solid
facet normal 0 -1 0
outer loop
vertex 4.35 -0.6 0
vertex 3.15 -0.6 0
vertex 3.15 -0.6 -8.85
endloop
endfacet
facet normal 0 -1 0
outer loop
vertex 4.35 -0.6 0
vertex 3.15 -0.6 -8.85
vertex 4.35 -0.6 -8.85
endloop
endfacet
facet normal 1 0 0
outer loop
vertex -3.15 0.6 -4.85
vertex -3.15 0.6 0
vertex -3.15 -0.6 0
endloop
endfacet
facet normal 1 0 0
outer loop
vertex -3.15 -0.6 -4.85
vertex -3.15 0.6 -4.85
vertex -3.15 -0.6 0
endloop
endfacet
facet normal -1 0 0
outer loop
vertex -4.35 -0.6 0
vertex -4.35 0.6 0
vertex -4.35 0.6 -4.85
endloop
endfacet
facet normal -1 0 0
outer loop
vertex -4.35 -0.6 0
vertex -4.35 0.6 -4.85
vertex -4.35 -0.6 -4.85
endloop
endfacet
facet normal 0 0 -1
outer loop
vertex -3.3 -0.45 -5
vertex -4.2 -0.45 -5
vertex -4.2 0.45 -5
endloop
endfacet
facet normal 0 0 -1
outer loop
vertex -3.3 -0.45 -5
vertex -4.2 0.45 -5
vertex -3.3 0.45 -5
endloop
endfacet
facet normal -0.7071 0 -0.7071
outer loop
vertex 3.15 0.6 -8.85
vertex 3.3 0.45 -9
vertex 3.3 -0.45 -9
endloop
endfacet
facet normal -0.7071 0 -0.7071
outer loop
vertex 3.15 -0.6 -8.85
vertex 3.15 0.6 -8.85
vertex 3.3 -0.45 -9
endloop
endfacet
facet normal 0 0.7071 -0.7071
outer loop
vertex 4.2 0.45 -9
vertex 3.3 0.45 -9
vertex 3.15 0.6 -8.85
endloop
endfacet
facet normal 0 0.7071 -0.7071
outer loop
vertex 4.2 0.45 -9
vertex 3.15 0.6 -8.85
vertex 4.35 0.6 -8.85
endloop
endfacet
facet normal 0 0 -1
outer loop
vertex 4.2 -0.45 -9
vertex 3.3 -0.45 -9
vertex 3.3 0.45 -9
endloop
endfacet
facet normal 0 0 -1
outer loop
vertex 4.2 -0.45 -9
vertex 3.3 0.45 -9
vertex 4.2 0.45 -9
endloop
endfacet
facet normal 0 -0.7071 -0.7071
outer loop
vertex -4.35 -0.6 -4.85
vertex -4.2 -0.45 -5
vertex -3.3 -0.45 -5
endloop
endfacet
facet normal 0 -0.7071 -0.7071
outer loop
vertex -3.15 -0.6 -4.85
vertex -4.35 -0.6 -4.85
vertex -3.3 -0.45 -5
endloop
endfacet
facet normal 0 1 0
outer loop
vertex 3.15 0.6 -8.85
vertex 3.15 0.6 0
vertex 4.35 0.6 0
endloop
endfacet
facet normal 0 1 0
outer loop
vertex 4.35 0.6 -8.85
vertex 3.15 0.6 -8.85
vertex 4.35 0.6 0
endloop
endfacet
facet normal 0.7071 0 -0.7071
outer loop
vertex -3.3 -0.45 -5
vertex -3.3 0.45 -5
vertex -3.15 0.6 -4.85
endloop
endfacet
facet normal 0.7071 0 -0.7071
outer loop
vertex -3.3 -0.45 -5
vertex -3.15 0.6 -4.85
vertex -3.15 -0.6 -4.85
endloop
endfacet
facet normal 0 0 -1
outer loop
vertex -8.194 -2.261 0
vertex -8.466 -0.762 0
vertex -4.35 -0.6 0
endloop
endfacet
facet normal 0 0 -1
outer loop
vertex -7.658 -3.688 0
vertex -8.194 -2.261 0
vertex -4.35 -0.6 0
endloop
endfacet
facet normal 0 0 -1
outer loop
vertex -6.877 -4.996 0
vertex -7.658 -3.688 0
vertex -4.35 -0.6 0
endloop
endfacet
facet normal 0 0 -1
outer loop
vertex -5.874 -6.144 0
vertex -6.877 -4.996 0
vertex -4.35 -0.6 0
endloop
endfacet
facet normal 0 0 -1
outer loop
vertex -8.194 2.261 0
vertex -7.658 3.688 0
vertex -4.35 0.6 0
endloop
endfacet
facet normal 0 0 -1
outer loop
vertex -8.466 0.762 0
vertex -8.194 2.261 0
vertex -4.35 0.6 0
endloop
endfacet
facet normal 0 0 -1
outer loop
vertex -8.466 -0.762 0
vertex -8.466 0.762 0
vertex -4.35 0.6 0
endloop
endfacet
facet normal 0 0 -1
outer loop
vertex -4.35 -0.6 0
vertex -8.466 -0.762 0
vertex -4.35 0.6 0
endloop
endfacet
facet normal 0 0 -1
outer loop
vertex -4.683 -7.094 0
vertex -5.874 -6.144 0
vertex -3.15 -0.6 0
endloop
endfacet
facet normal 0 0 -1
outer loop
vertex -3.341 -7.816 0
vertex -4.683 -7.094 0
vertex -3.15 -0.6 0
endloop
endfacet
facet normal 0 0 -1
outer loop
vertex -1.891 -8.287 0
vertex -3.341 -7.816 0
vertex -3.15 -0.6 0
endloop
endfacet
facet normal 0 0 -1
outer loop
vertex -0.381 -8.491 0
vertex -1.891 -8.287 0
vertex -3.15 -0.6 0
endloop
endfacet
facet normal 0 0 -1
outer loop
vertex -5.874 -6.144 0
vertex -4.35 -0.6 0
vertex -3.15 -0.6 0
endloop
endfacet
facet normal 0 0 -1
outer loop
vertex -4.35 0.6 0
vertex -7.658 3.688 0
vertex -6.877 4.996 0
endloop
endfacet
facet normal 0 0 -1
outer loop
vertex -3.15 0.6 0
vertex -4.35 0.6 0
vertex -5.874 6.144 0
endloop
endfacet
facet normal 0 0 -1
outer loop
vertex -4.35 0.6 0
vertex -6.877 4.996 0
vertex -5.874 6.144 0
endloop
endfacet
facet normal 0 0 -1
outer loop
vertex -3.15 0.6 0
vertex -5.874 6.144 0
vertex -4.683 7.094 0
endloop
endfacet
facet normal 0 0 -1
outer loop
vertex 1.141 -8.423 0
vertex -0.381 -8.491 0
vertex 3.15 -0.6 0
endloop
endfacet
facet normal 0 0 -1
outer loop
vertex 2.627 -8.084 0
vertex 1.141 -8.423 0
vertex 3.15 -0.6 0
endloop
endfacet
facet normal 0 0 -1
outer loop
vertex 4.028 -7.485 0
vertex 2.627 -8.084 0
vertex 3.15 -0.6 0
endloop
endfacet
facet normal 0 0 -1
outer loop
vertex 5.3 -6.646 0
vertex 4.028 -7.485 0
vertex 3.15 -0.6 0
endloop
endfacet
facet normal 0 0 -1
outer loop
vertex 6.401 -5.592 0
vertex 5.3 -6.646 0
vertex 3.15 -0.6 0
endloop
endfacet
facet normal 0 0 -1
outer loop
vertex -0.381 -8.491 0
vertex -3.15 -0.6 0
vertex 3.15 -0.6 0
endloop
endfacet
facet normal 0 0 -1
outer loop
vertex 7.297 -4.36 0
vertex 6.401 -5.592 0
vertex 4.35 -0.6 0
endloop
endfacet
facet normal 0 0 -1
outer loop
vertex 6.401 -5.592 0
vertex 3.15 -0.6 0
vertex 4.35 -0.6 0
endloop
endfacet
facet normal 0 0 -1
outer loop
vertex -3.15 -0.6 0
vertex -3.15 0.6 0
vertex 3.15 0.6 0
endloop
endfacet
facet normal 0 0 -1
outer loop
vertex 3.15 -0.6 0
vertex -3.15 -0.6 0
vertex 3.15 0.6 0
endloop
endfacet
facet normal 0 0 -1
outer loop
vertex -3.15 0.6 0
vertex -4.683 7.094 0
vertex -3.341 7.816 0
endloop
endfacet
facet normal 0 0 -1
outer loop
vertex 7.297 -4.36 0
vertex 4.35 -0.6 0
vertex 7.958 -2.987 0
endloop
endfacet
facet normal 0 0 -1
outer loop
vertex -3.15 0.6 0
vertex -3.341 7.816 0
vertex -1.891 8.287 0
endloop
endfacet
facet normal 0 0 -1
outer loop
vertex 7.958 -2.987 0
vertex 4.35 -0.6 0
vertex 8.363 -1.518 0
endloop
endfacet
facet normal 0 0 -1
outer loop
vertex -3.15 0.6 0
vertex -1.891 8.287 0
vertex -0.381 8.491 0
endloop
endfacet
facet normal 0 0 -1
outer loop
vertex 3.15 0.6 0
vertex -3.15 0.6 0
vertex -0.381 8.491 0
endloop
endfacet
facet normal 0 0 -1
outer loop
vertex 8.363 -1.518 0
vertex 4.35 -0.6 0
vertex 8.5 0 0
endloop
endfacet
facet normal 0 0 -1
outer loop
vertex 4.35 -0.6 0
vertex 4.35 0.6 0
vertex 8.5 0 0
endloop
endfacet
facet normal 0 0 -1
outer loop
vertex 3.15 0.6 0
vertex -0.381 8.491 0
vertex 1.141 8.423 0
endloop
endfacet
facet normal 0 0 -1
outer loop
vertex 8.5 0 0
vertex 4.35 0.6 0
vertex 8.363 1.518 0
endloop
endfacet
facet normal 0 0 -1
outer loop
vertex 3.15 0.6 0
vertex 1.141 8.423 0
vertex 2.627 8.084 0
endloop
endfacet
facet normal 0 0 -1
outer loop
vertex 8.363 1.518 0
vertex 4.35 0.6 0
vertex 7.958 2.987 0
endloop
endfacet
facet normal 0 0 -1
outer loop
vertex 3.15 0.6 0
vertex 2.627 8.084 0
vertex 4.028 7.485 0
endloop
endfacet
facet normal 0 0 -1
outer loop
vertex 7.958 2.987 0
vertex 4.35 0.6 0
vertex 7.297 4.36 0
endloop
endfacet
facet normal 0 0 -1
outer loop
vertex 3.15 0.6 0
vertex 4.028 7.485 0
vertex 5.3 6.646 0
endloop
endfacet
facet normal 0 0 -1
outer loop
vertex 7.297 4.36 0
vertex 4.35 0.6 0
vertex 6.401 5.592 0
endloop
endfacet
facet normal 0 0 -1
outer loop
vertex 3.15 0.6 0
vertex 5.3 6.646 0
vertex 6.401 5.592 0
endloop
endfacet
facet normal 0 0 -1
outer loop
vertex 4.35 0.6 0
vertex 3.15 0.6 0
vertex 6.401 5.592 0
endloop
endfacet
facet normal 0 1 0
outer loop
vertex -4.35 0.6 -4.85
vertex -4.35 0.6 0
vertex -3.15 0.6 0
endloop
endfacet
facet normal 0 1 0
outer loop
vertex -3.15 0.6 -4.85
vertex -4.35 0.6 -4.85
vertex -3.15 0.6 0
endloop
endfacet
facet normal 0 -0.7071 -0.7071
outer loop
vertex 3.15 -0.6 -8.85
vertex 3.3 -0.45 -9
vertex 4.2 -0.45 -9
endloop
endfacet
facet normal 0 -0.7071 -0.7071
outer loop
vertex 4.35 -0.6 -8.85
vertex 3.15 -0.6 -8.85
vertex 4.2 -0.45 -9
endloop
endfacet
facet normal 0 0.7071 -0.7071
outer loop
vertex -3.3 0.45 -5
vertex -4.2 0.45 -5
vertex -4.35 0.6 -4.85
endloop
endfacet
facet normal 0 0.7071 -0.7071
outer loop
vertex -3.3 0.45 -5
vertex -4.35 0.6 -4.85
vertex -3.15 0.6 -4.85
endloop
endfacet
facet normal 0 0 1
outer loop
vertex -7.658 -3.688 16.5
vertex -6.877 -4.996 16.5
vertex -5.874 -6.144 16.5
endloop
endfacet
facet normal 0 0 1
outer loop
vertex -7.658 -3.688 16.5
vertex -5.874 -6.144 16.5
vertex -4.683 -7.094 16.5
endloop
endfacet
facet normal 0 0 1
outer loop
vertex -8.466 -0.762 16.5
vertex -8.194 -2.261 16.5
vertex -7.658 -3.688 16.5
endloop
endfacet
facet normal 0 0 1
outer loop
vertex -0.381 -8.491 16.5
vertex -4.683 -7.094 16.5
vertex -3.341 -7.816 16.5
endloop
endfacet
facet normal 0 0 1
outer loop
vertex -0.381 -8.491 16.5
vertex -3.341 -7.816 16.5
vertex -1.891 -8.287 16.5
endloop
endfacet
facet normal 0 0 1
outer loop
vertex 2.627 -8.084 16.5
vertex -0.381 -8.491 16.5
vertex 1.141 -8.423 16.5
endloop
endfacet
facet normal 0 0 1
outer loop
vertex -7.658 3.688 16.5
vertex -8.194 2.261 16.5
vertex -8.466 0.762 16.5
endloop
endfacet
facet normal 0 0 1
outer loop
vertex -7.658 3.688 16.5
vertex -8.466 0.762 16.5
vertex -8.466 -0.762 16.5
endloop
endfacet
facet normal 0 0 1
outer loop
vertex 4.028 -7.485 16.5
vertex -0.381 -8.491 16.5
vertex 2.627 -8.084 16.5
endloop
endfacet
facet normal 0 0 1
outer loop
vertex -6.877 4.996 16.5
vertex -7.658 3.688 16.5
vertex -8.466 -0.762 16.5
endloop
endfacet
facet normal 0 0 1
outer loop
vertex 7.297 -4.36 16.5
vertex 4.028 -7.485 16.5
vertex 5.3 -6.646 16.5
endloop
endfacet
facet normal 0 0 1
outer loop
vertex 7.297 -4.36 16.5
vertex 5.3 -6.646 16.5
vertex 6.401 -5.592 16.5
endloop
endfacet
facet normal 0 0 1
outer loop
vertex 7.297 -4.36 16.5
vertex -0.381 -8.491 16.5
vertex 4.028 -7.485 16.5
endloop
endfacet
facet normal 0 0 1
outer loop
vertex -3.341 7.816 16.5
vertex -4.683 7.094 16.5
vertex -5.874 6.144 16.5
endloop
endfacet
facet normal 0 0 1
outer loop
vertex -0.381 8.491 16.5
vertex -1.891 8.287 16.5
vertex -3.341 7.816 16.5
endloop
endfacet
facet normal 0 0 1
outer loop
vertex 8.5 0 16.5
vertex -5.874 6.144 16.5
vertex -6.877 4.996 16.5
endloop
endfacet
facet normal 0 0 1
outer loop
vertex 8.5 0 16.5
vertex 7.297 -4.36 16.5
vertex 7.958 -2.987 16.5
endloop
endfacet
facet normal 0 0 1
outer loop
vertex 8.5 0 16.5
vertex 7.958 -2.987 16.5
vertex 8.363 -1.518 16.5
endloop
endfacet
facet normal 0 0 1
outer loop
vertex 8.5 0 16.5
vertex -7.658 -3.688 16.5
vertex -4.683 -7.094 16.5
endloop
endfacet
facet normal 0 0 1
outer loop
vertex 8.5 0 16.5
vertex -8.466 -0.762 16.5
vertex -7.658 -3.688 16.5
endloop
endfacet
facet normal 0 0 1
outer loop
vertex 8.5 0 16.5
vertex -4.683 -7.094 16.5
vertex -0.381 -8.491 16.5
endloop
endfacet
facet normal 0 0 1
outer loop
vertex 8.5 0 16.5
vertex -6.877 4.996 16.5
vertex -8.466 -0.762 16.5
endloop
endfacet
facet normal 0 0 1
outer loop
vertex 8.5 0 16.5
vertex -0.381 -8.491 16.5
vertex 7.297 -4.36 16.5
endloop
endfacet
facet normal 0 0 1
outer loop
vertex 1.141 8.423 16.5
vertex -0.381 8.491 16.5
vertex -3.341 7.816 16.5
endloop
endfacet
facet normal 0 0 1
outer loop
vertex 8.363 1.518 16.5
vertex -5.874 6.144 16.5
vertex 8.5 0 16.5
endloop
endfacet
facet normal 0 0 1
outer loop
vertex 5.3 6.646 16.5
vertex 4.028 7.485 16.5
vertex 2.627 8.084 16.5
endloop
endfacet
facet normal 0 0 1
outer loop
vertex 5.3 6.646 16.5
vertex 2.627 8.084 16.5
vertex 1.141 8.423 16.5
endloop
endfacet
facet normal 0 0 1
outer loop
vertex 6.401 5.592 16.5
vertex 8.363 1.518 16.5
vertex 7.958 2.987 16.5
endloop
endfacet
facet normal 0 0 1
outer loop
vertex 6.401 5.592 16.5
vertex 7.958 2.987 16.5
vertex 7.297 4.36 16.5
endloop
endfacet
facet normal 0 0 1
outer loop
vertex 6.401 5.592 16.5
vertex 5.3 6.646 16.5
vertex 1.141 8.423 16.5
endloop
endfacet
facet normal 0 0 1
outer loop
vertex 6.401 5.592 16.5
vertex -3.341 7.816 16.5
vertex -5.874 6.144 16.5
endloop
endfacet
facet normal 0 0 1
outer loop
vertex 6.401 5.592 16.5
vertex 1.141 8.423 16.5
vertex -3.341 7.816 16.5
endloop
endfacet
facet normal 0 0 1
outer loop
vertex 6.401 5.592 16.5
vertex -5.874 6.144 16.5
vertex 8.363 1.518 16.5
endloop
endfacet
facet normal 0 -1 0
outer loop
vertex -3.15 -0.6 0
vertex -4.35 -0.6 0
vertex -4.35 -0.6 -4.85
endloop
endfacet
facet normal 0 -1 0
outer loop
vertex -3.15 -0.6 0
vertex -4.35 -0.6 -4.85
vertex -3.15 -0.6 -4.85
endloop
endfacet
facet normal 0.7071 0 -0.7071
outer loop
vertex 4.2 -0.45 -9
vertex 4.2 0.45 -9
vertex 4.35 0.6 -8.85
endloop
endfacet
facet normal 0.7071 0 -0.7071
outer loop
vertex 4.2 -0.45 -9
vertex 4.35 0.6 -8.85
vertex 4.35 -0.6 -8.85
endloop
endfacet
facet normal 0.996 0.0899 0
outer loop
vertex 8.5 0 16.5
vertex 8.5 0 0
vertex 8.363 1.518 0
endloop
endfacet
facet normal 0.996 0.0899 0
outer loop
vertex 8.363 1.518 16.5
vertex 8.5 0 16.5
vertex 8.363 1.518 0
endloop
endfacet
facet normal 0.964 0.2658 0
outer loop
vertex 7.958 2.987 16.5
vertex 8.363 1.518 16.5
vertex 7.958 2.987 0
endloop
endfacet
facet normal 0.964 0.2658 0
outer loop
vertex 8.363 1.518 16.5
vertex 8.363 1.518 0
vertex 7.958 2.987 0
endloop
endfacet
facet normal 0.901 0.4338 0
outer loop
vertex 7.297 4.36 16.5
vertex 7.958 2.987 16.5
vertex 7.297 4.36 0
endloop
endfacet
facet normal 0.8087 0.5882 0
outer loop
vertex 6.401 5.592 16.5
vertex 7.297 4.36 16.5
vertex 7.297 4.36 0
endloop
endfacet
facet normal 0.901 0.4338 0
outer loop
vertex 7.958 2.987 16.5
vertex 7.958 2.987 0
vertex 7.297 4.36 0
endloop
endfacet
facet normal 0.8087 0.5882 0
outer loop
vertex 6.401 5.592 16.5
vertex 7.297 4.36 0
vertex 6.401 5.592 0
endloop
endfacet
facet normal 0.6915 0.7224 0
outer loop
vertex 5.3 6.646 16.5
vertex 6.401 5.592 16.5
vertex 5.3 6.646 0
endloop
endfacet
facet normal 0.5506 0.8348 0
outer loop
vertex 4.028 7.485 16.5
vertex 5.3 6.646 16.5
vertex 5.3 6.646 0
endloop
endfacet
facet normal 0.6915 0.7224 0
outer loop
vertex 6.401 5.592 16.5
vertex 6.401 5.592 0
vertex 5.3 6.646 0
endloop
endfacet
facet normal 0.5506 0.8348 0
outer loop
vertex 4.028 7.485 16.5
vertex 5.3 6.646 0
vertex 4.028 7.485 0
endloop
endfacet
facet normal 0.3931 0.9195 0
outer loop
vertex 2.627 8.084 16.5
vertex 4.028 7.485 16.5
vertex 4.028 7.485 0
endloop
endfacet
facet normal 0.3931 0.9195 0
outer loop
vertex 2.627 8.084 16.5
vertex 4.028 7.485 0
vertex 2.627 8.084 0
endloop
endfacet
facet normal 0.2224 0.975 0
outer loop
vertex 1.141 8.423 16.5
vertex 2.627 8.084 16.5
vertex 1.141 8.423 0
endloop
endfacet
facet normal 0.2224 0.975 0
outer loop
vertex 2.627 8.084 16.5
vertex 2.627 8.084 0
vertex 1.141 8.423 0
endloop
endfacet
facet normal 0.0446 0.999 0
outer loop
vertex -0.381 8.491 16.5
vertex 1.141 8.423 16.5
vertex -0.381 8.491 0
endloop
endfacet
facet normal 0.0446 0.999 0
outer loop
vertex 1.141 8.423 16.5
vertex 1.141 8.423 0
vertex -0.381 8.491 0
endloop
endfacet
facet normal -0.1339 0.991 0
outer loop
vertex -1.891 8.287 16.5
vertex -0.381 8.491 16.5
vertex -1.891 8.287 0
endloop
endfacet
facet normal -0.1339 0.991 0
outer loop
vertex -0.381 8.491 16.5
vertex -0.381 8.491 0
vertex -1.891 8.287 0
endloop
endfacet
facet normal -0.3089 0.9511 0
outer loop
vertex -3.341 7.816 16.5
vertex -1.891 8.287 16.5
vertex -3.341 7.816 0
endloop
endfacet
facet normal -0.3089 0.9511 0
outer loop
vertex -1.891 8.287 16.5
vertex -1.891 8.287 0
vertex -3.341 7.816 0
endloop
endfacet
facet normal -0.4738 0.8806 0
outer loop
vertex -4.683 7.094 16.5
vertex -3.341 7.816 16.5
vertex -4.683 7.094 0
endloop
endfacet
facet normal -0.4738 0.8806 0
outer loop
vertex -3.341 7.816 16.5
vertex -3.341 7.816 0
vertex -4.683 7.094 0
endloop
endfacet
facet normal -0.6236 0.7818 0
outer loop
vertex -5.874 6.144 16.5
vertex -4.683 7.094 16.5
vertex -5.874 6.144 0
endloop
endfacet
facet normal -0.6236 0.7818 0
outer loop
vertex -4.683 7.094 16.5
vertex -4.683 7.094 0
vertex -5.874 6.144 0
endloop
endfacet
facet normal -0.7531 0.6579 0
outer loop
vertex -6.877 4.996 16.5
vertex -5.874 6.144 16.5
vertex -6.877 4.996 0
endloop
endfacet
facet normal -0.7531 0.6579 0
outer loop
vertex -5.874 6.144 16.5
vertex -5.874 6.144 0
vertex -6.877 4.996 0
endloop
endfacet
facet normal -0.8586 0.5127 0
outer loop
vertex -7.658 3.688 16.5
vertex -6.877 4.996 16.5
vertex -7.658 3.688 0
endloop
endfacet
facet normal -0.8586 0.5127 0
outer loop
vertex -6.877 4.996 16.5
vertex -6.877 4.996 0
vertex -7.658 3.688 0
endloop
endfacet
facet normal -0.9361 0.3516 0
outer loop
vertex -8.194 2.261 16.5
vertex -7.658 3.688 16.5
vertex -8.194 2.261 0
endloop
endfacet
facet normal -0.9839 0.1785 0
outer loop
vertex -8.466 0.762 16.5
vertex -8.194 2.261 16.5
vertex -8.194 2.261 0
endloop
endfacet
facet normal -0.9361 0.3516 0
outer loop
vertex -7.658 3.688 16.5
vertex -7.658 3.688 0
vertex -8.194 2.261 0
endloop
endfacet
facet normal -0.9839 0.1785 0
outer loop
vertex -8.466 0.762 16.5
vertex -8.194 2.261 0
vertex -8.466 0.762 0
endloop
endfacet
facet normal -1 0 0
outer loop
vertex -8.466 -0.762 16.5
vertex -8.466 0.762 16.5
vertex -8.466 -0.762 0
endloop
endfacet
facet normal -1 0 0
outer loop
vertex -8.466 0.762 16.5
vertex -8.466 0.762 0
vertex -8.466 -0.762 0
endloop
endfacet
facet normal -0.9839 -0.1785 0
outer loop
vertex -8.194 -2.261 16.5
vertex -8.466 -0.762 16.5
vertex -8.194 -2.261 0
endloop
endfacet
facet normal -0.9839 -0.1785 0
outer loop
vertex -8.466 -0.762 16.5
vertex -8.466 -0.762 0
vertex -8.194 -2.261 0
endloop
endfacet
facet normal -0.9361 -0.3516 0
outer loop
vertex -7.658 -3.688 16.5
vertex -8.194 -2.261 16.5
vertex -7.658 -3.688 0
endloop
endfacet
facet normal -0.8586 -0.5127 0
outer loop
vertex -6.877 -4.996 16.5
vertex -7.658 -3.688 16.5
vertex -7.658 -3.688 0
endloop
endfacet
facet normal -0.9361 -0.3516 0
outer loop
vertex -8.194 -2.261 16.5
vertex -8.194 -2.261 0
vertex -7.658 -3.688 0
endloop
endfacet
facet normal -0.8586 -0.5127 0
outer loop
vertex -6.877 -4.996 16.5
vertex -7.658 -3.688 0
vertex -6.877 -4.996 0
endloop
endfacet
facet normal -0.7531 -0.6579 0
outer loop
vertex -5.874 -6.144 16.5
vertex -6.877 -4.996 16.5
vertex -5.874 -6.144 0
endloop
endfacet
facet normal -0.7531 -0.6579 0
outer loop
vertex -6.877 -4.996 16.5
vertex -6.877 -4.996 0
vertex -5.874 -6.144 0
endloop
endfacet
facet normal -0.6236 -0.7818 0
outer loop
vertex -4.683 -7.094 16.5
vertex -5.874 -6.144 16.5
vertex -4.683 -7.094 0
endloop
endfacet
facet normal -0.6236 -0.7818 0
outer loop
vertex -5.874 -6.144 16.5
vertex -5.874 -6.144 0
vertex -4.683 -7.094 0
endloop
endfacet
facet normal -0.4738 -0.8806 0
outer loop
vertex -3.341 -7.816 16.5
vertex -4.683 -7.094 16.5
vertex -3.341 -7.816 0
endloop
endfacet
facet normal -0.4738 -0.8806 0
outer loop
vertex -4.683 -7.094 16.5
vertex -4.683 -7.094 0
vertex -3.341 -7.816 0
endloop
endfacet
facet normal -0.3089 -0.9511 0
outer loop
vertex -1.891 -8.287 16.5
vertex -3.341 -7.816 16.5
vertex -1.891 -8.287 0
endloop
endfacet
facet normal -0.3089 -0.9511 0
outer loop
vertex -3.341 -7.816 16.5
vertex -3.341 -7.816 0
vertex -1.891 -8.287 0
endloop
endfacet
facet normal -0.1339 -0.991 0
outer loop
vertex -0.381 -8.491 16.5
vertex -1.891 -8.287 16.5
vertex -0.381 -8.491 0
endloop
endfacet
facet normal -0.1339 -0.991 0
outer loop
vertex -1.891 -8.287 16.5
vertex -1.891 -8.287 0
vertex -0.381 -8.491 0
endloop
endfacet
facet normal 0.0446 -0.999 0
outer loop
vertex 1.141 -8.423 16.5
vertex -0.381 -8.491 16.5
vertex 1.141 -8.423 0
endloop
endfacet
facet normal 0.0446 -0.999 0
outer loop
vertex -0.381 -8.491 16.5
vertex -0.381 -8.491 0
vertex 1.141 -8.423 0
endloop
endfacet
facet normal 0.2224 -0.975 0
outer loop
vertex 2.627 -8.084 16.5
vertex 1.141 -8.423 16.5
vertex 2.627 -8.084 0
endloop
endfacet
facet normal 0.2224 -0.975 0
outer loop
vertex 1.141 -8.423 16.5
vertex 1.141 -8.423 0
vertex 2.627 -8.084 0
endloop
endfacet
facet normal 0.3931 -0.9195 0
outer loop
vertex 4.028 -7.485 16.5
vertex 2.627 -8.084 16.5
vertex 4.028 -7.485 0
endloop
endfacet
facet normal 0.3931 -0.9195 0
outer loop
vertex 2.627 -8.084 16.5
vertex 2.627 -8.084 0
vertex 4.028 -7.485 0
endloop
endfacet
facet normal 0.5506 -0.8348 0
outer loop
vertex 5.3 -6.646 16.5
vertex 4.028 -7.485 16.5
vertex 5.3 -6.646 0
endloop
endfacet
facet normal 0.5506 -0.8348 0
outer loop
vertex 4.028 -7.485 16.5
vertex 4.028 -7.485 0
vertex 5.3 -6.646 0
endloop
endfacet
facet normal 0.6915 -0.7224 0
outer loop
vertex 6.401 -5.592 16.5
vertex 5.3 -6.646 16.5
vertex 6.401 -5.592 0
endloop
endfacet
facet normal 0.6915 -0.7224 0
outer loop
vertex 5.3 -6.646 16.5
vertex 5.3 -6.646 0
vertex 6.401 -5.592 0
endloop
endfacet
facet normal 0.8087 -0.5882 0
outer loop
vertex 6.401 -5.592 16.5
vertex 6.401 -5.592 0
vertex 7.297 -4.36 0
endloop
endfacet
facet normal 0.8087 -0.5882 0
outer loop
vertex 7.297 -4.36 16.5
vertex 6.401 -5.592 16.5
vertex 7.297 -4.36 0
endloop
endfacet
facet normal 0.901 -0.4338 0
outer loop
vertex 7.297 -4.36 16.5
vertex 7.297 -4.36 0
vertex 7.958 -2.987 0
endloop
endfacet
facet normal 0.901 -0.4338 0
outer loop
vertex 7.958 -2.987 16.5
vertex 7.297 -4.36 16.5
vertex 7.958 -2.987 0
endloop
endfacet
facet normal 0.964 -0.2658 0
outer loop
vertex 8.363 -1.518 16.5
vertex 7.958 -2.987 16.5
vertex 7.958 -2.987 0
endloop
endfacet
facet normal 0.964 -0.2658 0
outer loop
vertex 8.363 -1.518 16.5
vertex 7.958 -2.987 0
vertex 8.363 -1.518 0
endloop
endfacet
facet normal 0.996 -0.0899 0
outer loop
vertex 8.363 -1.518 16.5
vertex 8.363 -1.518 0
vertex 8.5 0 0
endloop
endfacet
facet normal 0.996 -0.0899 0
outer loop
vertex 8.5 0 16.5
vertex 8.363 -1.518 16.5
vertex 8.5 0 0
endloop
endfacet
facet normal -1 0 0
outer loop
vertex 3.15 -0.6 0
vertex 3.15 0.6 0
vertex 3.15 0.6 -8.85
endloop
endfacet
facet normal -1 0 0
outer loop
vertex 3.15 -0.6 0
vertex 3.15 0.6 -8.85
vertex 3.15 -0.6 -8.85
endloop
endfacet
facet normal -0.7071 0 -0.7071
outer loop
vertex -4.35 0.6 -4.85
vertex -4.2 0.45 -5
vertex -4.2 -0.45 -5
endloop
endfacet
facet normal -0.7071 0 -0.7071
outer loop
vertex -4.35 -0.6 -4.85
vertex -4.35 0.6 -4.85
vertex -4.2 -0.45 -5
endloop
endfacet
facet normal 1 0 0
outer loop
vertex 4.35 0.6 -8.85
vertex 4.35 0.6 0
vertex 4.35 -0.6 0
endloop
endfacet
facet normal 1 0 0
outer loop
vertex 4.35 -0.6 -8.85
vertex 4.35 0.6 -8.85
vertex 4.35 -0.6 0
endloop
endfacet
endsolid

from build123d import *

# Parameters (mm, degrees)
F0_R     = 8.5
F1_DEPTH = 16.5
F2_W     = 1.2
F2_H     = 1.2
F3_DEPTH = 5
F4_DEPTH = 9
F5_SIZE  = 0.15


with BuildPart() as f1:
    # F0 (on Top) → F1 (new body)
    with BuildSketch(Plane.XY):
        Circle(F0_R)
    extrude(amount=F1_DEPTH)

    # F2 (on face) → F3 (join)
    with BuildSketch(Plane(origin=(0, 0, 0), x_dir=(1, 0, 0), z_dir=(0, 0, -1))):
        with Locations((-3.75, 0)):
            Rectangle(F2_W, F2_H)
    extrude(amount=F3_DEPTH)

    # F2 (on face) → F4 (join)
    with BuildSketch(Plane(origin=(0, 0, 0), x_dir=(1, 0, 0), z_dir=(0, 0, -1))):
        with Locations((3.75, 0)):
            Rectangle(F2_W, F2_H)
    extrude(amount=F4_DEPTH)

    # F5
    f5_edges = [f1.edges().sort_by_distance(p)[0] for p in [
        (-3.75, -0.6, -5),
        (-4.35, 0, -5),
        (-3.75, 0.6, -5),
        (-3.15, 0, -5),
        (3.15, 0, -9),
        (3.75, -0.6, -9),
        (4.35, 0, -9),
        (3.75, 0.6, -9),
    ]]
    chamfer(f5_edges, length=F5_SIZE)


solid = f1.part
